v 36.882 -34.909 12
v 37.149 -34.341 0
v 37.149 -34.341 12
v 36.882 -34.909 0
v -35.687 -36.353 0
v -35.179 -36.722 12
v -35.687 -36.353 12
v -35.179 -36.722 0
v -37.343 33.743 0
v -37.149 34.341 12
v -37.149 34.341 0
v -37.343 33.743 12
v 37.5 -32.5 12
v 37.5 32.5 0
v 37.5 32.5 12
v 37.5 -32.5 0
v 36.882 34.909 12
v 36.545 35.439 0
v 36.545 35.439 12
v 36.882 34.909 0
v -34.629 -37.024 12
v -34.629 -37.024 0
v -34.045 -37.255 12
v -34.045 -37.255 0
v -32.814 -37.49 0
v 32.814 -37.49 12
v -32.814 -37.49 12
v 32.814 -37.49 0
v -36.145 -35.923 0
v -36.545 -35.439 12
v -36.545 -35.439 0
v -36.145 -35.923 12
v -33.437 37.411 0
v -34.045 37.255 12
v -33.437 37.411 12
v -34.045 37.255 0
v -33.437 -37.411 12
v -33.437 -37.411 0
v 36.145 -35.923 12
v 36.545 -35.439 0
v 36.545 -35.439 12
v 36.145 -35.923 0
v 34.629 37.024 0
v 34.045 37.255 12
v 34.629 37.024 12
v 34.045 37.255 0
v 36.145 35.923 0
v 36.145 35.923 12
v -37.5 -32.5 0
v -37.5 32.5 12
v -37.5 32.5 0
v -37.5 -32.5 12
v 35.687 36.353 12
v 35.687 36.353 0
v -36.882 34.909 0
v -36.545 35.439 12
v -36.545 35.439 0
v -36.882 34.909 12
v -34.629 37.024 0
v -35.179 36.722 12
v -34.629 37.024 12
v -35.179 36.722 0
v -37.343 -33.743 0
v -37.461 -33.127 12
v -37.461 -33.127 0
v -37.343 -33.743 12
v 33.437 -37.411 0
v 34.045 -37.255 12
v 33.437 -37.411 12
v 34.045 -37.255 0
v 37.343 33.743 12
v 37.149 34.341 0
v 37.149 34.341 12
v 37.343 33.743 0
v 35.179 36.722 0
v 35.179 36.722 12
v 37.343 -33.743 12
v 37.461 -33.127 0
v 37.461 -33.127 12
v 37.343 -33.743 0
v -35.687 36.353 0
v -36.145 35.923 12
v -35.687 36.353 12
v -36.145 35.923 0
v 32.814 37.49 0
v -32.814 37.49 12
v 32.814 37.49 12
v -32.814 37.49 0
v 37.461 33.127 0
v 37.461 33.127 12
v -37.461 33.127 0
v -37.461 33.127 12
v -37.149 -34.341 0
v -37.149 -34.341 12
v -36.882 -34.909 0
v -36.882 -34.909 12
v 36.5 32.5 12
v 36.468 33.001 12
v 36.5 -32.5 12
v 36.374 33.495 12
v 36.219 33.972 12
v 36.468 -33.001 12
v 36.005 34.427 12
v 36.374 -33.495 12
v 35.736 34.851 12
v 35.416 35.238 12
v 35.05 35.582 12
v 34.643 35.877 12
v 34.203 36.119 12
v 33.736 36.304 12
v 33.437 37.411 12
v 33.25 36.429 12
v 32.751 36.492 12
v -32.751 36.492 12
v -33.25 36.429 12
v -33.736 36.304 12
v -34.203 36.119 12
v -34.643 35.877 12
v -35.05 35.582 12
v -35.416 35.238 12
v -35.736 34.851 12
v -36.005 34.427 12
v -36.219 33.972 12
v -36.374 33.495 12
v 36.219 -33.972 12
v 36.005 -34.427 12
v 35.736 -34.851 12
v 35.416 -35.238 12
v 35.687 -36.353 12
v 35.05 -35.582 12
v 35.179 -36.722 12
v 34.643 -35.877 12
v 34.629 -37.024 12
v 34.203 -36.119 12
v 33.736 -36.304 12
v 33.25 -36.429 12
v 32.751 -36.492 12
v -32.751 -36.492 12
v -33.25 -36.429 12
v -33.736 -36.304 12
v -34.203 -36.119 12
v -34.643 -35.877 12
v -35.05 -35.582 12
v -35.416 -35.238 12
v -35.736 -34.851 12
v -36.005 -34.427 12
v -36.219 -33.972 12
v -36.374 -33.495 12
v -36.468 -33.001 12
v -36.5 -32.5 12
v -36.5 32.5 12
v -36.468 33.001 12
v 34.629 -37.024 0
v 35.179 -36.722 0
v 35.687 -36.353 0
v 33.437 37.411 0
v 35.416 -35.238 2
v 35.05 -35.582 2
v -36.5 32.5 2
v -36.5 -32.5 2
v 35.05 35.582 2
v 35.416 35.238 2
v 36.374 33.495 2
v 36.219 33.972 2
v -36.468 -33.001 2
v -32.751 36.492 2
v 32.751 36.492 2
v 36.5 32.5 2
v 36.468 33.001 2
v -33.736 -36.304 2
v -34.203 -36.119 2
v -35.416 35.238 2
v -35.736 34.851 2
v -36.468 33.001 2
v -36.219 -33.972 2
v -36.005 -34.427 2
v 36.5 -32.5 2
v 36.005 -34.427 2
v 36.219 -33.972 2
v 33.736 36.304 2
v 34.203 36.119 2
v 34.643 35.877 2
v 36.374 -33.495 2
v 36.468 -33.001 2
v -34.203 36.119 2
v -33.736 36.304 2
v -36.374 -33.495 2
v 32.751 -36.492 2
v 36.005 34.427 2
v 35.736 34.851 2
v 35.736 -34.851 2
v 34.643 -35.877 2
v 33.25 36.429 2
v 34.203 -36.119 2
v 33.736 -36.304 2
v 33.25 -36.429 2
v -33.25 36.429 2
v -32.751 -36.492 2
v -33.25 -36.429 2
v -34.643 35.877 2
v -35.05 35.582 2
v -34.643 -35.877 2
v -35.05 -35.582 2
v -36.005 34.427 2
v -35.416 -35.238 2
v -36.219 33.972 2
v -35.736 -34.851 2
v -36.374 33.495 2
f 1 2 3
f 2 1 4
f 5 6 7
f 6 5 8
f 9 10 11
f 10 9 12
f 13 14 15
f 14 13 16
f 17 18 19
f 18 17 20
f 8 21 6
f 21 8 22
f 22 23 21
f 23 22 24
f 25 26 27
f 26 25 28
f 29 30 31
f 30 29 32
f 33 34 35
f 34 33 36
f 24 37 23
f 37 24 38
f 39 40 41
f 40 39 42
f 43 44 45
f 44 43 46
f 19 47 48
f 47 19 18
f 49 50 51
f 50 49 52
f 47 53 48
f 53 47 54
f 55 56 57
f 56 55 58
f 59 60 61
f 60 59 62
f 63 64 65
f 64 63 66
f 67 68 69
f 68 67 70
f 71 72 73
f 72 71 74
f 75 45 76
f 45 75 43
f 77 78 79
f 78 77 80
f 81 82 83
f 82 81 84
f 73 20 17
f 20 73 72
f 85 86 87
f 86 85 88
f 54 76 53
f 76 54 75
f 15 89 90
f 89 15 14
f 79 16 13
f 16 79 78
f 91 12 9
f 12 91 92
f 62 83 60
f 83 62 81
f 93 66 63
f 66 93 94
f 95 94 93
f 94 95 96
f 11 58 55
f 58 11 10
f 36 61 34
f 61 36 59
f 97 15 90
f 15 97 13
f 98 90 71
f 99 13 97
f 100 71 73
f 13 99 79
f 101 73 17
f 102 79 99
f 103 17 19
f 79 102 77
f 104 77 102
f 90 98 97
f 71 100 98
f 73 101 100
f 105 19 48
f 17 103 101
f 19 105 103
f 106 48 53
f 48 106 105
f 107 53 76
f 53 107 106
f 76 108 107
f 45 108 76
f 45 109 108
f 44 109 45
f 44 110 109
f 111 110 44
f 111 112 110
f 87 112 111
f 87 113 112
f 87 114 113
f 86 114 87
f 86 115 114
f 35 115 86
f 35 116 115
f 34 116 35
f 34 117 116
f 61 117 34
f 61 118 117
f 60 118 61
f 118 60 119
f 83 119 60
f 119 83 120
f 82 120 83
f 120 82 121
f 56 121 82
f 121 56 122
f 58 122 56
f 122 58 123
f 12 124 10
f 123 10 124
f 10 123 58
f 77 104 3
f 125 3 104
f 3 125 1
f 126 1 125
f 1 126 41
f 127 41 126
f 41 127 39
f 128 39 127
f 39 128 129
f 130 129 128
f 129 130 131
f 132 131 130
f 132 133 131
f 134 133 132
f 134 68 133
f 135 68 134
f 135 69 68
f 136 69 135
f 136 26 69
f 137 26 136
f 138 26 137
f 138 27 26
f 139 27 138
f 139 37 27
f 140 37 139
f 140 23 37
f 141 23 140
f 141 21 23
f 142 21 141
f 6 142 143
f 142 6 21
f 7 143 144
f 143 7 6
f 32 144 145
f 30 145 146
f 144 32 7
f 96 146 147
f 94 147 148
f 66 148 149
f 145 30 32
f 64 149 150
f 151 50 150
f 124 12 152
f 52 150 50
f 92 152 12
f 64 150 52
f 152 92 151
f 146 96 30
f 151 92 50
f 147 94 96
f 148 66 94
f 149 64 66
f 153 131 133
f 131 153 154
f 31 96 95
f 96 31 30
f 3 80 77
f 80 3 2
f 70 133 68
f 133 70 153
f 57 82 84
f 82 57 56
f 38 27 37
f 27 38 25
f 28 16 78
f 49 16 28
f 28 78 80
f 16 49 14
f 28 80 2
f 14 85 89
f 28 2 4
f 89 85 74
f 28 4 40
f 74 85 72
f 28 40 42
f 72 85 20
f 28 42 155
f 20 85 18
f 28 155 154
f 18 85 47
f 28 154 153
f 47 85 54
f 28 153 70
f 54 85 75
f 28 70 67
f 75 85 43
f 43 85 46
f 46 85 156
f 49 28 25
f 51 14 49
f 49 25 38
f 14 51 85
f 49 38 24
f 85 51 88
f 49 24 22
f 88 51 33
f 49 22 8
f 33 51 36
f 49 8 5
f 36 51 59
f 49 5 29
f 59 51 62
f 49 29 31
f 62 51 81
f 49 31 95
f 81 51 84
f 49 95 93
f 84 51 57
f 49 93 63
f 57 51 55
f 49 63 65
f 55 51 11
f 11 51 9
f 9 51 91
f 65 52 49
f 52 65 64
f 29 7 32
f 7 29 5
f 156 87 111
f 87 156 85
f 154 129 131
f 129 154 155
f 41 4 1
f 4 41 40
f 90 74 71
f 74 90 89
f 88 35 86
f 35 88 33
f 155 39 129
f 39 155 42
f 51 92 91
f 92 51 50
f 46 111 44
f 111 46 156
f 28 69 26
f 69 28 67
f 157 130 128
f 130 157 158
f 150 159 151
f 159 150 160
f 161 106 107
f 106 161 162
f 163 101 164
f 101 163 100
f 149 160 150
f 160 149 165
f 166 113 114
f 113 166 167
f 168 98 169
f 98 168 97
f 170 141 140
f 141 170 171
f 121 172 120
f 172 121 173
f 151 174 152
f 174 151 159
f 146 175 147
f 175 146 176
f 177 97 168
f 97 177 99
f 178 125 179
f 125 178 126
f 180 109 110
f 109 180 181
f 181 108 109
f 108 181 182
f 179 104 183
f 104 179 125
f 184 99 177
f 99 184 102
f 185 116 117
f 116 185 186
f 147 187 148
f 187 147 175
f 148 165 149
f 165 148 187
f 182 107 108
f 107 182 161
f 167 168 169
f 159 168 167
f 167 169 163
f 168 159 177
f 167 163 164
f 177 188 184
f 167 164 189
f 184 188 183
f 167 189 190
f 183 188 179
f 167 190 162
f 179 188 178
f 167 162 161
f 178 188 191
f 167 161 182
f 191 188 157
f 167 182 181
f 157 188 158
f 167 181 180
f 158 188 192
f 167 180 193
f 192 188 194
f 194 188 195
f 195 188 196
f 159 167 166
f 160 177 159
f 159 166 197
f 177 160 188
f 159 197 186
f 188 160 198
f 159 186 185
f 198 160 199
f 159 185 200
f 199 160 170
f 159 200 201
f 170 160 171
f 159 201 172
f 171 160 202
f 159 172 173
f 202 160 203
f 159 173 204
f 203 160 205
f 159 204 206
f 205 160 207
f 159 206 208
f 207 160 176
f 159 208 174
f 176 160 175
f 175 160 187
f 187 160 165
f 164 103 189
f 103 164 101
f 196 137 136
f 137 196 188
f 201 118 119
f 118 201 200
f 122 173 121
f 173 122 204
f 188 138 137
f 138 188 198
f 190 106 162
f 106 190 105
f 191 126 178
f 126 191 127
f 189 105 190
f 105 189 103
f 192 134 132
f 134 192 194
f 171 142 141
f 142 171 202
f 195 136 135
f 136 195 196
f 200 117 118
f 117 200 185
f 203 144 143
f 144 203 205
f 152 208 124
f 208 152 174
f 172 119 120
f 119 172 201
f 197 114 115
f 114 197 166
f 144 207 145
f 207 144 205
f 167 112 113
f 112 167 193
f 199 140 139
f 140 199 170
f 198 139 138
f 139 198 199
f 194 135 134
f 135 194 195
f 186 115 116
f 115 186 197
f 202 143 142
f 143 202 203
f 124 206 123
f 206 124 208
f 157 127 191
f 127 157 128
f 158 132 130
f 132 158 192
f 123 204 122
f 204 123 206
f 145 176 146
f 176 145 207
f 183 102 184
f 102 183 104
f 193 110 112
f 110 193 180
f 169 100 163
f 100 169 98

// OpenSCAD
$fn = 50;


difference() {
	union() {
		hull() {
			translate(v = [-32.5000000000, 32.5000000000, 0]) {
				cylinder(h = 12, r = 5);
			}
			translate(v = [32.5000000000, 32.5000000000, 0]) {
				cylinder(h = 12, r = 5);
			}
			translate(v = [-32.5000000000, -32.5000000000, 0]) {
				cylinder(h = 12, r = 5);
			}
			translate(v = [32.5000000000, -32.5000000000, 0]) {
				cylinder(h = 12, r = 5);
			}
		}
	}
	union() {
		translate(v = [0, 0, 2]) {
			hull() {
				translate(v = [-32.5000000000, 32.5000000000, 0]) {
					cylinder(h = 10, r = 4);
				}
				translate(v = [32.5000000000, 32.5000000000, 0]) {
					cylinder(h = 10, r = 4);
				}
				translate(v = [-32.5000000000, -32.5000000000, 0]) {
					cylinder(h = 10, r = 4);
				}
				translate(v = [32.5000000000, -32.5000000000, 0]) {
					cylinder(h = 10, r = 4);
				}
			}
		}
	}
}
